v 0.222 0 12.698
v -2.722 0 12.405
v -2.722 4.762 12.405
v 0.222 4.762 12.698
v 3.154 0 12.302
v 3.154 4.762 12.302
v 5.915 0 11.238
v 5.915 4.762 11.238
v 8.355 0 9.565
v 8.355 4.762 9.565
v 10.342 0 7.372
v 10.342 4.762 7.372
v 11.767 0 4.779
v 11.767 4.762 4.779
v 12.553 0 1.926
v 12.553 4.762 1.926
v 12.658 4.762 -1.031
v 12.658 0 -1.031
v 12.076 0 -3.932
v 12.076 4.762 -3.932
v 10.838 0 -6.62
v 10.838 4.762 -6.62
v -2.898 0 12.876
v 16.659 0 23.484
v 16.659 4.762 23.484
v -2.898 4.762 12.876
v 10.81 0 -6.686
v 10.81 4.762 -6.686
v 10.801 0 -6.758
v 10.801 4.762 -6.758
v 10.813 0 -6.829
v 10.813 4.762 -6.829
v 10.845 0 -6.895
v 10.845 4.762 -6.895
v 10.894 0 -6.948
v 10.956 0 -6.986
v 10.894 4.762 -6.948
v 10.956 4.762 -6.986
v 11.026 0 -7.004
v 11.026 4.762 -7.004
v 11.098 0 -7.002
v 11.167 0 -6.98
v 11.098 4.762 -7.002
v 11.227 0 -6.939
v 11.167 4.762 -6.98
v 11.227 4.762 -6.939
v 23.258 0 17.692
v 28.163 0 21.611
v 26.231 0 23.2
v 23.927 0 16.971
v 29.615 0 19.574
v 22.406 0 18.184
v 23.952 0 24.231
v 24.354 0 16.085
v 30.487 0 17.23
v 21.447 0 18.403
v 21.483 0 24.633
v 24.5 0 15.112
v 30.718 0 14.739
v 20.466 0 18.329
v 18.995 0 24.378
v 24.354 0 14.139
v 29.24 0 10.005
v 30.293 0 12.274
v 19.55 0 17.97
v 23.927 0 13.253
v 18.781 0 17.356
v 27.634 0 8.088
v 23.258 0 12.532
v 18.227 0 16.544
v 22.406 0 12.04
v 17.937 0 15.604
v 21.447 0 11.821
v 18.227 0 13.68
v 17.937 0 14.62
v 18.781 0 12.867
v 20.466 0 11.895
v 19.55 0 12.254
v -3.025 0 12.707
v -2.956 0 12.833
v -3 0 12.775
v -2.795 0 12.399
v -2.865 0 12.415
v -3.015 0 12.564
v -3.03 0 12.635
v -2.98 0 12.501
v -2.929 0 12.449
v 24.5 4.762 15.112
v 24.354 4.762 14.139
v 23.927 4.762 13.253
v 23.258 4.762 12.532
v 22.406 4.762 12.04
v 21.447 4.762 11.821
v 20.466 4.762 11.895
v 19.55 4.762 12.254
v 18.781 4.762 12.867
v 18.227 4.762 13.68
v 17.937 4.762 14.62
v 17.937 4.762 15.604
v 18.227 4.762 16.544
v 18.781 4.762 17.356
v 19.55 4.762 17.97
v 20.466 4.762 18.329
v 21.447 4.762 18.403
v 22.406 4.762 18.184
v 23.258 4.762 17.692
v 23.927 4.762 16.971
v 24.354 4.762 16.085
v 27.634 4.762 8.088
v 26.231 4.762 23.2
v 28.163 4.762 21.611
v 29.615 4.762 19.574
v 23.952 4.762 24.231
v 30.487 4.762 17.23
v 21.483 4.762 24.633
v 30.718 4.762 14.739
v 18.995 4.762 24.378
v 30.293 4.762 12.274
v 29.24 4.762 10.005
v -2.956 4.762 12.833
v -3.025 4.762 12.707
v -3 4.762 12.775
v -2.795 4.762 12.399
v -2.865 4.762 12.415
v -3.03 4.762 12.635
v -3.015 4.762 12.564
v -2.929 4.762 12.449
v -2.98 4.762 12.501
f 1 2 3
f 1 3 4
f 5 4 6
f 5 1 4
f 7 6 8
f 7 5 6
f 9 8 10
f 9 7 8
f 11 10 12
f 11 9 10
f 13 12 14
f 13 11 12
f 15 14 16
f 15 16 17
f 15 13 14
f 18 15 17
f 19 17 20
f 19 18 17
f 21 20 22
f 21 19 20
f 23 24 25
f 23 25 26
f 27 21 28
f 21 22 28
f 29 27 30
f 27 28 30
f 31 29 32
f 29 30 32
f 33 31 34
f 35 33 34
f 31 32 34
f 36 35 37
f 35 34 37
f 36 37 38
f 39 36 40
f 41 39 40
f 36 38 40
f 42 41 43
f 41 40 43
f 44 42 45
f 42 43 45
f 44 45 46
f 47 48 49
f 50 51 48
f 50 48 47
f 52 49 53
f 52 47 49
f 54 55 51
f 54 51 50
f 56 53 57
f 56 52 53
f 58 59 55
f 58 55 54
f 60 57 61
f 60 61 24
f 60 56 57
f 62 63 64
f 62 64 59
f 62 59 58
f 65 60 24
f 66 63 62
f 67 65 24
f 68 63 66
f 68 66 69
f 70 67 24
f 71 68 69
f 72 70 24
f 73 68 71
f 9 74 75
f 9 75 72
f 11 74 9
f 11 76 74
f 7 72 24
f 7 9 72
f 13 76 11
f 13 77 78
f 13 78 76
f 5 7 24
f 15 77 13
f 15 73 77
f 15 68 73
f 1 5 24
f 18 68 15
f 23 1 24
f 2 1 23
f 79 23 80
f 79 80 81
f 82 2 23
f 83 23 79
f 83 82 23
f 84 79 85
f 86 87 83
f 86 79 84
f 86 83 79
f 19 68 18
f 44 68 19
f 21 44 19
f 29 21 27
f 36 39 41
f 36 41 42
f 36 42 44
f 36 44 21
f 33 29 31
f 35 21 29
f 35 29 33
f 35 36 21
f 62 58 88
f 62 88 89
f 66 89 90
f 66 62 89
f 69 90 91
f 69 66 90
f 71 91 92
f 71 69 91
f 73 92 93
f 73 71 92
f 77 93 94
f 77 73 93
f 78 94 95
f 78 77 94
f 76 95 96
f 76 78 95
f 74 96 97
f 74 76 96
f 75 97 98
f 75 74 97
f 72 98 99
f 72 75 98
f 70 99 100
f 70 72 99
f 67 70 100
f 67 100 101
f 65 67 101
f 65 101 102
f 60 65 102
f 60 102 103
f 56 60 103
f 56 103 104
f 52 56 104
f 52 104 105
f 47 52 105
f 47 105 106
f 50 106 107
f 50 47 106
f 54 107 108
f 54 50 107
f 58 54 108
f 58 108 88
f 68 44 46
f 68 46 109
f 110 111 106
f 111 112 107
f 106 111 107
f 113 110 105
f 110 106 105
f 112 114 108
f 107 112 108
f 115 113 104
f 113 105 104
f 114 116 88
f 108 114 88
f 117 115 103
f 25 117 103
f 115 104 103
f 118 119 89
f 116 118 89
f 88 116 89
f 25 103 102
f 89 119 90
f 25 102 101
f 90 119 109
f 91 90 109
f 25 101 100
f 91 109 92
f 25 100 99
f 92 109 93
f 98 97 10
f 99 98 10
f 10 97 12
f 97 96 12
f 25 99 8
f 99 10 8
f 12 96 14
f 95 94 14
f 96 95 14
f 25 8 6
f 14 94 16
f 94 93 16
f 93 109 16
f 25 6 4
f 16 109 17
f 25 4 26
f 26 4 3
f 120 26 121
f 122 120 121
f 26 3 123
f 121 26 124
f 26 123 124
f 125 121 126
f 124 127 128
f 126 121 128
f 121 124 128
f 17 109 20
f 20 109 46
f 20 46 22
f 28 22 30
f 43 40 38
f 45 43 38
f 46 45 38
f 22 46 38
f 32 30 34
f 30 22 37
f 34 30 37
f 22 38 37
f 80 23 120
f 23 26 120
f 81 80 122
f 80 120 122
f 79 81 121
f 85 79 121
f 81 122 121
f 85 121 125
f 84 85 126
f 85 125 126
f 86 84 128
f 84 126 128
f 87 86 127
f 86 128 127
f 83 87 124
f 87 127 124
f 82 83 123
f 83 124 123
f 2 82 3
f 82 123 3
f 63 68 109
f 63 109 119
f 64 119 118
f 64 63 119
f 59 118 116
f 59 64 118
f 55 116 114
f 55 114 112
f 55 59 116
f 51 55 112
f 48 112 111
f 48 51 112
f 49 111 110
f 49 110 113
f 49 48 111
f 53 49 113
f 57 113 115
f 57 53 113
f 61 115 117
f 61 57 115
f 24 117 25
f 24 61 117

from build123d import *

# Parameters (mm, degrees)
SKETCH1_R           = 3.3
BOSS_EXTRUDE1_DEPTH = 4.7625
FILLET1_R           = 0.254


with BuildPart() as part:
    # Sketch1 → Boss-Extrude1 (new body)
    with BuildSketch(Plane(origin=(0, 0, 0), x_dir=(1, 0, 0), z_dir=(0, 1, 0))):
        with BuildLine():
            Line((16.658671, -23.484448), (-6.055469, -11.163391))
            ThreePointArc((-6.055469, -11.163391), (10.341596, -7.371661), (8.57781, 9.365425))
            Line((8.57781, 9.365425), (27.63363, -8.087836))
            ThreePointArc((27.63363, -8.087836), (28.95647, -20.64065), (16.658671, -23.484448))
        make_face()
        with Locations((21.200273, -15.111905)):
            Circle(SKETCH1_R, mode=Mode.SUBTRACT)
    extrude(amount=BOSS_EXTRUDE1_DEPTH)

    # Fillet1
    fillet1_edges = [part.edges().sort_by_distance(p)[0] for p in [
        (-6.055469, 2.38125, 11.163391),
        (8.57781, 2.38125, -9.365425),
    ]]
    fillet(fillet1_edges, radius=FILLET1_R)


solid = part.part
